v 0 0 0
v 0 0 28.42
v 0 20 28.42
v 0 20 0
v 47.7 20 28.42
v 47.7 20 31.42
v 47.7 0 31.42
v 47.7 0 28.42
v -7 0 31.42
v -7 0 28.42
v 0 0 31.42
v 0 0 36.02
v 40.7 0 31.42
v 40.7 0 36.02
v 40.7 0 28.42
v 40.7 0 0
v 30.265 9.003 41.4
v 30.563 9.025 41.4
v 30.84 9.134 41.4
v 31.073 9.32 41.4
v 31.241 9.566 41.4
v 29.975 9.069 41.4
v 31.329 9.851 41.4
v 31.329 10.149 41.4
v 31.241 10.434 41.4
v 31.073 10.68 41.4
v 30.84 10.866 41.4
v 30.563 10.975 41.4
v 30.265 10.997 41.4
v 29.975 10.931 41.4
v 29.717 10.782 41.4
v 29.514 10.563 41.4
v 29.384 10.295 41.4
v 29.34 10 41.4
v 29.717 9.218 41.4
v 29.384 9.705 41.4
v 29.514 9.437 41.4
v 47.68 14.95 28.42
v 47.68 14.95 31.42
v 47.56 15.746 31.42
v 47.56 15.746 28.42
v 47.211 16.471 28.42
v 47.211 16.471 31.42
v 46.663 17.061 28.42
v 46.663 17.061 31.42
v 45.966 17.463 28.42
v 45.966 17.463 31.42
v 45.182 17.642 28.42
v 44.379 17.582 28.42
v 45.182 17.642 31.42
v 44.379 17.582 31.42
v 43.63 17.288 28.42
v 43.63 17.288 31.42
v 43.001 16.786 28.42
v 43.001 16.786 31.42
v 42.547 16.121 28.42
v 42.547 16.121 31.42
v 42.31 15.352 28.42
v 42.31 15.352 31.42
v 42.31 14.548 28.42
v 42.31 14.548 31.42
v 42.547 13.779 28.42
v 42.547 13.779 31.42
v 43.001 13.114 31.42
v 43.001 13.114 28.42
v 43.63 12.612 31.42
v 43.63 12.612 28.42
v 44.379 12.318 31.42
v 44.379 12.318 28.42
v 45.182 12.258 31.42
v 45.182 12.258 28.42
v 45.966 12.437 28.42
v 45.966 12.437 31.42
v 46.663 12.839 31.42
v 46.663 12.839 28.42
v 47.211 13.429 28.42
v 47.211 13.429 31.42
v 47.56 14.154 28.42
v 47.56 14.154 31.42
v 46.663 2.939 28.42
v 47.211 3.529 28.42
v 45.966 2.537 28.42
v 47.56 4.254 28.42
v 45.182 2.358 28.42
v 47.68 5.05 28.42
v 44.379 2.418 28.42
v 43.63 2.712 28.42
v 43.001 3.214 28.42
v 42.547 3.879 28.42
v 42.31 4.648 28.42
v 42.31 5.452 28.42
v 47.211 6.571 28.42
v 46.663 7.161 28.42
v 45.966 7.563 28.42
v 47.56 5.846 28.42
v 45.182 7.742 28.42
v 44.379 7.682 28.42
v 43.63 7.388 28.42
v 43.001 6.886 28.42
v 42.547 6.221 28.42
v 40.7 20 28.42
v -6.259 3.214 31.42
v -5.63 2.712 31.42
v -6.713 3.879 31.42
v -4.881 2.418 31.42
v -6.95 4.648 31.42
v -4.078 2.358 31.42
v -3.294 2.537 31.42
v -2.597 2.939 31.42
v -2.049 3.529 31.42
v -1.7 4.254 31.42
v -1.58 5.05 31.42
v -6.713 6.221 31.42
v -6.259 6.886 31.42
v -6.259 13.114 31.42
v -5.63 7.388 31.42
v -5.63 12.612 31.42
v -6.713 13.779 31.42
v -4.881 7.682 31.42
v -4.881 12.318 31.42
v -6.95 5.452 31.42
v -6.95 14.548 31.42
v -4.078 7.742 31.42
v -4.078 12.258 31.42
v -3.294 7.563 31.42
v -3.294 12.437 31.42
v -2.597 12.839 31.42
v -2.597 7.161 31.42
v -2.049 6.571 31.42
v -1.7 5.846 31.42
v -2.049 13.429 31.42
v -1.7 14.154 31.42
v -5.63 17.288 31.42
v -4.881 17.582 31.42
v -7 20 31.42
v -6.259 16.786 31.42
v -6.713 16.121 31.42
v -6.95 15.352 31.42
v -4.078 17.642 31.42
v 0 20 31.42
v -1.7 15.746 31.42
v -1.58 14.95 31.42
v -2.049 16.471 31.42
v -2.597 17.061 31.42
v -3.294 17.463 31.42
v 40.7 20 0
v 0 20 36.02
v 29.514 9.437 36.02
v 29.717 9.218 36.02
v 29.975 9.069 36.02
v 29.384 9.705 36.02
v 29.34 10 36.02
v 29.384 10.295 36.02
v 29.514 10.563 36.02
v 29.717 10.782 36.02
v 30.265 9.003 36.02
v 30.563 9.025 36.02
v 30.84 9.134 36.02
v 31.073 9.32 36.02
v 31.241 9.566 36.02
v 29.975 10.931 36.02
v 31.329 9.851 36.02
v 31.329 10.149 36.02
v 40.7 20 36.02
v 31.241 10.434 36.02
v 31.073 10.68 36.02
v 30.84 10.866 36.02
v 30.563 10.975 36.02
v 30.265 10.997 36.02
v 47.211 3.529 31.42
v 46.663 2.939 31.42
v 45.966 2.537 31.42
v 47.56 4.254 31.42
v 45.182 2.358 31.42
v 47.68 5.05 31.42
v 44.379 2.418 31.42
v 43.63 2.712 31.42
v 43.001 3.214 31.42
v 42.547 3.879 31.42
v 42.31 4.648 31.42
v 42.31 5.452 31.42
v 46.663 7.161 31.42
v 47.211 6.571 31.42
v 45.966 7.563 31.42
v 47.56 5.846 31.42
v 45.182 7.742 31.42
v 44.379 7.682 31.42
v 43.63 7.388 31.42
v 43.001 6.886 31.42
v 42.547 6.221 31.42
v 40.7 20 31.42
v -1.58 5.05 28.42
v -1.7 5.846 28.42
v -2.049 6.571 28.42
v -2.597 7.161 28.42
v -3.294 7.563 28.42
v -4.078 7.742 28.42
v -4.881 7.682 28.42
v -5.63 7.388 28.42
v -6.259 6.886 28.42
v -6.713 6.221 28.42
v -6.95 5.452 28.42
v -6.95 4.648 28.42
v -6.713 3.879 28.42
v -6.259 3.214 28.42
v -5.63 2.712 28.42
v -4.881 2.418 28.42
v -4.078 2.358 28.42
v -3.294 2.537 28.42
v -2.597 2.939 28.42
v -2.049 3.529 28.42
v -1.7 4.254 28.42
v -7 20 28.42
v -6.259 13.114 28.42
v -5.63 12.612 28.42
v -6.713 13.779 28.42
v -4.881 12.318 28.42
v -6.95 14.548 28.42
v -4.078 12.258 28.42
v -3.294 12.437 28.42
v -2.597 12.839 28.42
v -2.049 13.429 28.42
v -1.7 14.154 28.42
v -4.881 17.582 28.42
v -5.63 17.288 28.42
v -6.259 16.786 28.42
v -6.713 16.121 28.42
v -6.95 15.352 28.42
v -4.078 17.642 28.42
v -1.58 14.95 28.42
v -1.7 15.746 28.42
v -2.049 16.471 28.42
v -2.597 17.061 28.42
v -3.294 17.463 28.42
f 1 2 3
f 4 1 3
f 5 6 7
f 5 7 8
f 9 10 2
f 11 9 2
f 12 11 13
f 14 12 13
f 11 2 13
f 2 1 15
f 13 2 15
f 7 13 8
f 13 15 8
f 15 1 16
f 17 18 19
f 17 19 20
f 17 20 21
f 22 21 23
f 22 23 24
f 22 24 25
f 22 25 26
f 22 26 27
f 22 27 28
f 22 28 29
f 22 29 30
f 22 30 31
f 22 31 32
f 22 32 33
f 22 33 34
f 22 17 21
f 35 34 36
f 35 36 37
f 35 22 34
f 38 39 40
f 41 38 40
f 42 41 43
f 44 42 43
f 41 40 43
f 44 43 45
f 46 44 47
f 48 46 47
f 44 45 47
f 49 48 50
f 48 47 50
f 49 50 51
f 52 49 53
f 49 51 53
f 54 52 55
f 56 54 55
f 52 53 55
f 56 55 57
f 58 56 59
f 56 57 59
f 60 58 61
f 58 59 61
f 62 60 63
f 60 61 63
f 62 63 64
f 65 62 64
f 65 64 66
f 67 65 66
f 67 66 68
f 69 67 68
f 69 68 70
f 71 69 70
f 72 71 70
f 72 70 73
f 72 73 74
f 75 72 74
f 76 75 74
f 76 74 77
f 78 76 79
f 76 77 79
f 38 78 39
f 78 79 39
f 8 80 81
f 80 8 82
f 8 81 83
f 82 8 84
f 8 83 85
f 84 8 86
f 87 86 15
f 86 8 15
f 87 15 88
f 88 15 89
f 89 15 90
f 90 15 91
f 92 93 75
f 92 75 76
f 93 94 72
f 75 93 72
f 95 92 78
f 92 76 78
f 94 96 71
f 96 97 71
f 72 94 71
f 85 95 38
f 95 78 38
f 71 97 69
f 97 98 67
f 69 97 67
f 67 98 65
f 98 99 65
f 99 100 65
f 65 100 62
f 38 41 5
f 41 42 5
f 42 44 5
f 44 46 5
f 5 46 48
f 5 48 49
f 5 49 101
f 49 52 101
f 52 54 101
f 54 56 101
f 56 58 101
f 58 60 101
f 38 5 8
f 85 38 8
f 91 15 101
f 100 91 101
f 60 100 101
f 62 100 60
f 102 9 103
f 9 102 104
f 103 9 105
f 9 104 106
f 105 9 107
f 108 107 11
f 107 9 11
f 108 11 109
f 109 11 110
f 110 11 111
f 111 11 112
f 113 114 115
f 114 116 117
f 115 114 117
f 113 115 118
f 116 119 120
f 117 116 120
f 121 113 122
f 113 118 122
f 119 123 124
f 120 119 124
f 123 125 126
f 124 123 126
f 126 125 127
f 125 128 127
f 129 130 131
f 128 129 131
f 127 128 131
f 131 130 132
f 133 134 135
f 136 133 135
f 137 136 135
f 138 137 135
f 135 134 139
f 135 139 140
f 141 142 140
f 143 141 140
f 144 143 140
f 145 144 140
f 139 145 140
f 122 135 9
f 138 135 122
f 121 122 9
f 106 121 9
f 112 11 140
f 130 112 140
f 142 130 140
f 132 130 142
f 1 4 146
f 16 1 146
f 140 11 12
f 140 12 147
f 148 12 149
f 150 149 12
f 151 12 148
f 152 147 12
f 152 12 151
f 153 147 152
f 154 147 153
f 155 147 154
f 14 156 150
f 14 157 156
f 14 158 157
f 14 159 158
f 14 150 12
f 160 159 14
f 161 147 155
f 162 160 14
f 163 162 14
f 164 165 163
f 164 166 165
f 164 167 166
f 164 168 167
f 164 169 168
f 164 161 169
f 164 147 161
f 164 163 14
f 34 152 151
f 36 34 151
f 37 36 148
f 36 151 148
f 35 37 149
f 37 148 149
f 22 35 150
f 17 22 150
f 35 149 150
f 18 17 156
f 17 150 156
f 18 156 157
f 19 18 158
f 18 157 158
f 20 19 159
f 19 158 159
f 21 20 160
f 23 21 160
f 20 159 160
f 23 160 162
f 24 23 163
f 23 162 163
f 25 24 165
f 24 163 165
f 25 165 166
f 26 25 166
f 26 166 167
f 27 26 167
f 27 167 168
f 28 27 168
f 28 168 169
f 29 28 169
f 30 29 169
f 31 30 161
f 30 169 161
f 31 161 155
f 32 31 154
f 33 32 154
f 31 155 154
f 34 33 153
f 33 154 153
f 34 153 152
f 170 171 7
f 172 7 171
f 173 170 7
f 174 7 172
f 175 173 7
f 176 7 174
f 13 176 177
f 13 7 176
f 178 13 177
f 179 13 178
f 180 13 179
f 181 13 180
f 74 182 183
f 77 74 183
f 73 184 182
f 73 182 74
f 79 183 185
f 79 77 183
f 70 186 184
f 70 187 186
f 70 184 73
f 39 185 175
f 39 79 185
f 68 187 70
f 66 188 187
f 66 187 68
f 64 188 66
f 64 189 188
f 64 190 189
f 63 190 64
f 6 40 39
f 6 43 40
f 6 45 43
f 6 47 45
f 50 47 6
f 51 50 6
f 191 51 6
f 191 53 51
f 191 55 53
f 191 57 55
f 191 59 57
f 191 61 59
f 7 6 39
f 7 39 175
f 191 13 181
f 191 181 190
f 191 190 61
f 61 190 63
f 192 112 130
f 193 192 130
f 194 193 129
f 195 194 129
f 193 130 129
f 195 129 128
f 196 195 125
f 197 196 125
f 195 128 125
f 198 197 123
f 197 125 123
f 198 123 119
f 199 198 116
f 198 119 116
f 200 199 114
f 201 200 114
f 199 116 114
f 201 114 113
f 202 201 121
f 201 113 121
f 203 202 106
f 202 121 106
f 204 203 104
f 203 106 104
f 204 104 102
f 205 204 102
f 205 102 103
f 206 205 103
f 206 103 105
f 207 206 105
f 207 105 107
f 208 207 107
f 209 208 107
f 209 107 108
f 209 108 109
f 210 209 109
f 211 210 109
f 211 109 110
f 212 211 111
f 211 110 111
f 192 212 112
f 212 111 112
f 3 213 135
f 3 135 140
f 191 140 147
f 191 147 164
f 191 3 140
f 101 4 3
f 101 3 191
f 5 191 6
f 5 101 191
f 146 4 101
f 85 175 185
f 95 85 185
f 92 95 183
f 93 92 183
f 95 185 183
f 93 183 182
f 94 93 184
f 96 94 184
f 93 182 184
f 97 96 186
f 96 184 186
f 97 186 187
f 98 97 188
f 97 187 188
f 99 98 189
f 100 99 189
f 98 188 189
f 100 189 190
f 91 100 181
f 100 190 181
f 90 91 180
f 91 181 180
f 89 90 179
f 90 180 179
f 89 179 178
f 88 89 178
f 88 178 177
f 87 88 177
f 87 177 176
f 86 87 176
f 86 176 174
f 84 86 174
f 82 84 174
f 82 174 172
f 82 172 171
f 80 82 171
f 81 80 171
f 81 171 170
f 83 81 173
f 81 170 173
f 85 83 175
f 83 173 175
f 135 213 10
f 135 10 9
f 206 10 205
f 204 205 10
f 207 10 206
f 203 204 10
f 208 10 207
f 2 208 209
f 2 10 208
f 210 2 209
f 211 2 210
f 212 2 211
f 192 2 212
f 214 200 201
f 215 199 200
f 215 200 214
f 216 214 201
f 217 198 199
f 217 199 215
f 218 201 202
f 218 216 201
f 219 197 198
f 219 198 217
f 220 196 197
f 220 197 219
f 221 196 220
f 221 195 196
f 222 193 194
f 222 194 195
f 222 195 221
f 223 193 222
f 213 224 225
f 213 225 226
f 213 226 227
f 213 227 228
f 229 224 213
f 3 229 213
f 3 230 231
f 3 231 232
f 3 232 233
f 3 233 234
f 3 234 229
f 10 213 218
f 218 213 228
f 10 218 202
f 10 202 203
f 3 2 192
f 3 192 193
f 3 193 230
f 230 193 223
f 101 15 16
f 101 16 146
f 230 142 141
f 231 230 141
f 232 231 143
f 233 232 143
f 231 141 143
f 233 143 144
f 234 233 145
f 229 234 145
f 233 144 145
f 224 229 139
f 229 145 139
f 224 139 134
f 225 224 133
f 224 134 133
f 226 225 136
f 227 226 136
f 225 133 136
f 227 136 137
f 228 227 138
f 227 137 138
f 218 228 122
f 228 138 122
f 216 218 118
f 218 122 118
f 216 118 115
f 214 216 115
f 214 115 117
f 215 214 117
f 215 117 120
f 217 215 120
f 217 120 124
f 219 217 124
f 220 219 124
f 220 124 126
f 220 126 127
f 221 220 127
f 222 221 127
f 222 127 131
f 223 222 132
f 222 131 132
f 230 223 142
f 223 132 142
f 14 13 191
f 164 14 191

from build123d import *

# Parameters (mm, degrees)
SKETCH1_W           = 40.7
SKETCH1_H           = 20
BOSS_EXTRUDE1_DEPTH = 36.02
SKETCH3_R           = 1
BOSS_EXTRUDE2_DEPTH = 5.38
SKETCH4_W           = 3
SKETCH4_H           = 20
BOSS_EXTRUDE3_DEPTH = 7
SKETCH6_W           = 3
SKETCH6_H           = 20
BOSS_EXTRUDE4_DEPTH = 7
SKETCH7_R           = 2.7
CUT_EXTRUDE1_DEPTH  = 3


with BuildPart() as part:
    # Sketch1 → Boss-Extrude1 (new body)
    with BuildSketch(Plane.XY):
        with Locations((20.35, 10)):
            Rectangle(SKETCH1_W, SKETCH1_H)
    extrude(amount=BOSS_EXTRUDE1_DEPTH)

    # Sketch3 → Boss-Extrude2 (add)
    with BuildSketch(Plane.XY.offset(36.02)):
        with Locations(Location((30.34, 10, 0), (0, 0, 180))):
            Circle(SKETCH3_R)
    extrude(amount=BOSS_EXTRUDE2_DEPTH)

    # Sketch4 → Boss-Extrude3 (add)
    with BuildSketch(Plane(origin=(40.7, 0, 0), x_dir=(0, 0, -1), z_dir=(1, 0, 0))):
        with Locations((-29.92, 10)):
            Rectangle(SKETCH4_W, SKETCH4_H)
    extrude(amount=BOSS_EXTRUDE3_DEPTH)

    # Sketch6 → Boss-Extrude4 (add)
    with BuildSketch(Plane.ZY):
        with Locations((29.92, 10)):
            Rectangle(SKETCH6_W, SKETCH6_H)
    extrude(amount=BOSS_EXTRUDE4_DEPTH)

    # Sketch7 → Cut-Extrude1 (cut)
    with BuildSketch(Plane.XY.offset(31.42)):
        with Locations((-4.28, 14.95)):
            Circle(SKETCH7_R)
        with Locations((-4.28, 5.05)):
            Circle(SKETCH7_R)
        with Locations((44.98, 14.95)):
            Circle(SKETCH7_R)
        with Locations((44.98, 5.05)):
            Circle(SKETCH7_R)
    extrude(amount=-CUT_EXTRUDE1_DEPTH, mode=Mode.SUBTRACT)


solid = part.part
